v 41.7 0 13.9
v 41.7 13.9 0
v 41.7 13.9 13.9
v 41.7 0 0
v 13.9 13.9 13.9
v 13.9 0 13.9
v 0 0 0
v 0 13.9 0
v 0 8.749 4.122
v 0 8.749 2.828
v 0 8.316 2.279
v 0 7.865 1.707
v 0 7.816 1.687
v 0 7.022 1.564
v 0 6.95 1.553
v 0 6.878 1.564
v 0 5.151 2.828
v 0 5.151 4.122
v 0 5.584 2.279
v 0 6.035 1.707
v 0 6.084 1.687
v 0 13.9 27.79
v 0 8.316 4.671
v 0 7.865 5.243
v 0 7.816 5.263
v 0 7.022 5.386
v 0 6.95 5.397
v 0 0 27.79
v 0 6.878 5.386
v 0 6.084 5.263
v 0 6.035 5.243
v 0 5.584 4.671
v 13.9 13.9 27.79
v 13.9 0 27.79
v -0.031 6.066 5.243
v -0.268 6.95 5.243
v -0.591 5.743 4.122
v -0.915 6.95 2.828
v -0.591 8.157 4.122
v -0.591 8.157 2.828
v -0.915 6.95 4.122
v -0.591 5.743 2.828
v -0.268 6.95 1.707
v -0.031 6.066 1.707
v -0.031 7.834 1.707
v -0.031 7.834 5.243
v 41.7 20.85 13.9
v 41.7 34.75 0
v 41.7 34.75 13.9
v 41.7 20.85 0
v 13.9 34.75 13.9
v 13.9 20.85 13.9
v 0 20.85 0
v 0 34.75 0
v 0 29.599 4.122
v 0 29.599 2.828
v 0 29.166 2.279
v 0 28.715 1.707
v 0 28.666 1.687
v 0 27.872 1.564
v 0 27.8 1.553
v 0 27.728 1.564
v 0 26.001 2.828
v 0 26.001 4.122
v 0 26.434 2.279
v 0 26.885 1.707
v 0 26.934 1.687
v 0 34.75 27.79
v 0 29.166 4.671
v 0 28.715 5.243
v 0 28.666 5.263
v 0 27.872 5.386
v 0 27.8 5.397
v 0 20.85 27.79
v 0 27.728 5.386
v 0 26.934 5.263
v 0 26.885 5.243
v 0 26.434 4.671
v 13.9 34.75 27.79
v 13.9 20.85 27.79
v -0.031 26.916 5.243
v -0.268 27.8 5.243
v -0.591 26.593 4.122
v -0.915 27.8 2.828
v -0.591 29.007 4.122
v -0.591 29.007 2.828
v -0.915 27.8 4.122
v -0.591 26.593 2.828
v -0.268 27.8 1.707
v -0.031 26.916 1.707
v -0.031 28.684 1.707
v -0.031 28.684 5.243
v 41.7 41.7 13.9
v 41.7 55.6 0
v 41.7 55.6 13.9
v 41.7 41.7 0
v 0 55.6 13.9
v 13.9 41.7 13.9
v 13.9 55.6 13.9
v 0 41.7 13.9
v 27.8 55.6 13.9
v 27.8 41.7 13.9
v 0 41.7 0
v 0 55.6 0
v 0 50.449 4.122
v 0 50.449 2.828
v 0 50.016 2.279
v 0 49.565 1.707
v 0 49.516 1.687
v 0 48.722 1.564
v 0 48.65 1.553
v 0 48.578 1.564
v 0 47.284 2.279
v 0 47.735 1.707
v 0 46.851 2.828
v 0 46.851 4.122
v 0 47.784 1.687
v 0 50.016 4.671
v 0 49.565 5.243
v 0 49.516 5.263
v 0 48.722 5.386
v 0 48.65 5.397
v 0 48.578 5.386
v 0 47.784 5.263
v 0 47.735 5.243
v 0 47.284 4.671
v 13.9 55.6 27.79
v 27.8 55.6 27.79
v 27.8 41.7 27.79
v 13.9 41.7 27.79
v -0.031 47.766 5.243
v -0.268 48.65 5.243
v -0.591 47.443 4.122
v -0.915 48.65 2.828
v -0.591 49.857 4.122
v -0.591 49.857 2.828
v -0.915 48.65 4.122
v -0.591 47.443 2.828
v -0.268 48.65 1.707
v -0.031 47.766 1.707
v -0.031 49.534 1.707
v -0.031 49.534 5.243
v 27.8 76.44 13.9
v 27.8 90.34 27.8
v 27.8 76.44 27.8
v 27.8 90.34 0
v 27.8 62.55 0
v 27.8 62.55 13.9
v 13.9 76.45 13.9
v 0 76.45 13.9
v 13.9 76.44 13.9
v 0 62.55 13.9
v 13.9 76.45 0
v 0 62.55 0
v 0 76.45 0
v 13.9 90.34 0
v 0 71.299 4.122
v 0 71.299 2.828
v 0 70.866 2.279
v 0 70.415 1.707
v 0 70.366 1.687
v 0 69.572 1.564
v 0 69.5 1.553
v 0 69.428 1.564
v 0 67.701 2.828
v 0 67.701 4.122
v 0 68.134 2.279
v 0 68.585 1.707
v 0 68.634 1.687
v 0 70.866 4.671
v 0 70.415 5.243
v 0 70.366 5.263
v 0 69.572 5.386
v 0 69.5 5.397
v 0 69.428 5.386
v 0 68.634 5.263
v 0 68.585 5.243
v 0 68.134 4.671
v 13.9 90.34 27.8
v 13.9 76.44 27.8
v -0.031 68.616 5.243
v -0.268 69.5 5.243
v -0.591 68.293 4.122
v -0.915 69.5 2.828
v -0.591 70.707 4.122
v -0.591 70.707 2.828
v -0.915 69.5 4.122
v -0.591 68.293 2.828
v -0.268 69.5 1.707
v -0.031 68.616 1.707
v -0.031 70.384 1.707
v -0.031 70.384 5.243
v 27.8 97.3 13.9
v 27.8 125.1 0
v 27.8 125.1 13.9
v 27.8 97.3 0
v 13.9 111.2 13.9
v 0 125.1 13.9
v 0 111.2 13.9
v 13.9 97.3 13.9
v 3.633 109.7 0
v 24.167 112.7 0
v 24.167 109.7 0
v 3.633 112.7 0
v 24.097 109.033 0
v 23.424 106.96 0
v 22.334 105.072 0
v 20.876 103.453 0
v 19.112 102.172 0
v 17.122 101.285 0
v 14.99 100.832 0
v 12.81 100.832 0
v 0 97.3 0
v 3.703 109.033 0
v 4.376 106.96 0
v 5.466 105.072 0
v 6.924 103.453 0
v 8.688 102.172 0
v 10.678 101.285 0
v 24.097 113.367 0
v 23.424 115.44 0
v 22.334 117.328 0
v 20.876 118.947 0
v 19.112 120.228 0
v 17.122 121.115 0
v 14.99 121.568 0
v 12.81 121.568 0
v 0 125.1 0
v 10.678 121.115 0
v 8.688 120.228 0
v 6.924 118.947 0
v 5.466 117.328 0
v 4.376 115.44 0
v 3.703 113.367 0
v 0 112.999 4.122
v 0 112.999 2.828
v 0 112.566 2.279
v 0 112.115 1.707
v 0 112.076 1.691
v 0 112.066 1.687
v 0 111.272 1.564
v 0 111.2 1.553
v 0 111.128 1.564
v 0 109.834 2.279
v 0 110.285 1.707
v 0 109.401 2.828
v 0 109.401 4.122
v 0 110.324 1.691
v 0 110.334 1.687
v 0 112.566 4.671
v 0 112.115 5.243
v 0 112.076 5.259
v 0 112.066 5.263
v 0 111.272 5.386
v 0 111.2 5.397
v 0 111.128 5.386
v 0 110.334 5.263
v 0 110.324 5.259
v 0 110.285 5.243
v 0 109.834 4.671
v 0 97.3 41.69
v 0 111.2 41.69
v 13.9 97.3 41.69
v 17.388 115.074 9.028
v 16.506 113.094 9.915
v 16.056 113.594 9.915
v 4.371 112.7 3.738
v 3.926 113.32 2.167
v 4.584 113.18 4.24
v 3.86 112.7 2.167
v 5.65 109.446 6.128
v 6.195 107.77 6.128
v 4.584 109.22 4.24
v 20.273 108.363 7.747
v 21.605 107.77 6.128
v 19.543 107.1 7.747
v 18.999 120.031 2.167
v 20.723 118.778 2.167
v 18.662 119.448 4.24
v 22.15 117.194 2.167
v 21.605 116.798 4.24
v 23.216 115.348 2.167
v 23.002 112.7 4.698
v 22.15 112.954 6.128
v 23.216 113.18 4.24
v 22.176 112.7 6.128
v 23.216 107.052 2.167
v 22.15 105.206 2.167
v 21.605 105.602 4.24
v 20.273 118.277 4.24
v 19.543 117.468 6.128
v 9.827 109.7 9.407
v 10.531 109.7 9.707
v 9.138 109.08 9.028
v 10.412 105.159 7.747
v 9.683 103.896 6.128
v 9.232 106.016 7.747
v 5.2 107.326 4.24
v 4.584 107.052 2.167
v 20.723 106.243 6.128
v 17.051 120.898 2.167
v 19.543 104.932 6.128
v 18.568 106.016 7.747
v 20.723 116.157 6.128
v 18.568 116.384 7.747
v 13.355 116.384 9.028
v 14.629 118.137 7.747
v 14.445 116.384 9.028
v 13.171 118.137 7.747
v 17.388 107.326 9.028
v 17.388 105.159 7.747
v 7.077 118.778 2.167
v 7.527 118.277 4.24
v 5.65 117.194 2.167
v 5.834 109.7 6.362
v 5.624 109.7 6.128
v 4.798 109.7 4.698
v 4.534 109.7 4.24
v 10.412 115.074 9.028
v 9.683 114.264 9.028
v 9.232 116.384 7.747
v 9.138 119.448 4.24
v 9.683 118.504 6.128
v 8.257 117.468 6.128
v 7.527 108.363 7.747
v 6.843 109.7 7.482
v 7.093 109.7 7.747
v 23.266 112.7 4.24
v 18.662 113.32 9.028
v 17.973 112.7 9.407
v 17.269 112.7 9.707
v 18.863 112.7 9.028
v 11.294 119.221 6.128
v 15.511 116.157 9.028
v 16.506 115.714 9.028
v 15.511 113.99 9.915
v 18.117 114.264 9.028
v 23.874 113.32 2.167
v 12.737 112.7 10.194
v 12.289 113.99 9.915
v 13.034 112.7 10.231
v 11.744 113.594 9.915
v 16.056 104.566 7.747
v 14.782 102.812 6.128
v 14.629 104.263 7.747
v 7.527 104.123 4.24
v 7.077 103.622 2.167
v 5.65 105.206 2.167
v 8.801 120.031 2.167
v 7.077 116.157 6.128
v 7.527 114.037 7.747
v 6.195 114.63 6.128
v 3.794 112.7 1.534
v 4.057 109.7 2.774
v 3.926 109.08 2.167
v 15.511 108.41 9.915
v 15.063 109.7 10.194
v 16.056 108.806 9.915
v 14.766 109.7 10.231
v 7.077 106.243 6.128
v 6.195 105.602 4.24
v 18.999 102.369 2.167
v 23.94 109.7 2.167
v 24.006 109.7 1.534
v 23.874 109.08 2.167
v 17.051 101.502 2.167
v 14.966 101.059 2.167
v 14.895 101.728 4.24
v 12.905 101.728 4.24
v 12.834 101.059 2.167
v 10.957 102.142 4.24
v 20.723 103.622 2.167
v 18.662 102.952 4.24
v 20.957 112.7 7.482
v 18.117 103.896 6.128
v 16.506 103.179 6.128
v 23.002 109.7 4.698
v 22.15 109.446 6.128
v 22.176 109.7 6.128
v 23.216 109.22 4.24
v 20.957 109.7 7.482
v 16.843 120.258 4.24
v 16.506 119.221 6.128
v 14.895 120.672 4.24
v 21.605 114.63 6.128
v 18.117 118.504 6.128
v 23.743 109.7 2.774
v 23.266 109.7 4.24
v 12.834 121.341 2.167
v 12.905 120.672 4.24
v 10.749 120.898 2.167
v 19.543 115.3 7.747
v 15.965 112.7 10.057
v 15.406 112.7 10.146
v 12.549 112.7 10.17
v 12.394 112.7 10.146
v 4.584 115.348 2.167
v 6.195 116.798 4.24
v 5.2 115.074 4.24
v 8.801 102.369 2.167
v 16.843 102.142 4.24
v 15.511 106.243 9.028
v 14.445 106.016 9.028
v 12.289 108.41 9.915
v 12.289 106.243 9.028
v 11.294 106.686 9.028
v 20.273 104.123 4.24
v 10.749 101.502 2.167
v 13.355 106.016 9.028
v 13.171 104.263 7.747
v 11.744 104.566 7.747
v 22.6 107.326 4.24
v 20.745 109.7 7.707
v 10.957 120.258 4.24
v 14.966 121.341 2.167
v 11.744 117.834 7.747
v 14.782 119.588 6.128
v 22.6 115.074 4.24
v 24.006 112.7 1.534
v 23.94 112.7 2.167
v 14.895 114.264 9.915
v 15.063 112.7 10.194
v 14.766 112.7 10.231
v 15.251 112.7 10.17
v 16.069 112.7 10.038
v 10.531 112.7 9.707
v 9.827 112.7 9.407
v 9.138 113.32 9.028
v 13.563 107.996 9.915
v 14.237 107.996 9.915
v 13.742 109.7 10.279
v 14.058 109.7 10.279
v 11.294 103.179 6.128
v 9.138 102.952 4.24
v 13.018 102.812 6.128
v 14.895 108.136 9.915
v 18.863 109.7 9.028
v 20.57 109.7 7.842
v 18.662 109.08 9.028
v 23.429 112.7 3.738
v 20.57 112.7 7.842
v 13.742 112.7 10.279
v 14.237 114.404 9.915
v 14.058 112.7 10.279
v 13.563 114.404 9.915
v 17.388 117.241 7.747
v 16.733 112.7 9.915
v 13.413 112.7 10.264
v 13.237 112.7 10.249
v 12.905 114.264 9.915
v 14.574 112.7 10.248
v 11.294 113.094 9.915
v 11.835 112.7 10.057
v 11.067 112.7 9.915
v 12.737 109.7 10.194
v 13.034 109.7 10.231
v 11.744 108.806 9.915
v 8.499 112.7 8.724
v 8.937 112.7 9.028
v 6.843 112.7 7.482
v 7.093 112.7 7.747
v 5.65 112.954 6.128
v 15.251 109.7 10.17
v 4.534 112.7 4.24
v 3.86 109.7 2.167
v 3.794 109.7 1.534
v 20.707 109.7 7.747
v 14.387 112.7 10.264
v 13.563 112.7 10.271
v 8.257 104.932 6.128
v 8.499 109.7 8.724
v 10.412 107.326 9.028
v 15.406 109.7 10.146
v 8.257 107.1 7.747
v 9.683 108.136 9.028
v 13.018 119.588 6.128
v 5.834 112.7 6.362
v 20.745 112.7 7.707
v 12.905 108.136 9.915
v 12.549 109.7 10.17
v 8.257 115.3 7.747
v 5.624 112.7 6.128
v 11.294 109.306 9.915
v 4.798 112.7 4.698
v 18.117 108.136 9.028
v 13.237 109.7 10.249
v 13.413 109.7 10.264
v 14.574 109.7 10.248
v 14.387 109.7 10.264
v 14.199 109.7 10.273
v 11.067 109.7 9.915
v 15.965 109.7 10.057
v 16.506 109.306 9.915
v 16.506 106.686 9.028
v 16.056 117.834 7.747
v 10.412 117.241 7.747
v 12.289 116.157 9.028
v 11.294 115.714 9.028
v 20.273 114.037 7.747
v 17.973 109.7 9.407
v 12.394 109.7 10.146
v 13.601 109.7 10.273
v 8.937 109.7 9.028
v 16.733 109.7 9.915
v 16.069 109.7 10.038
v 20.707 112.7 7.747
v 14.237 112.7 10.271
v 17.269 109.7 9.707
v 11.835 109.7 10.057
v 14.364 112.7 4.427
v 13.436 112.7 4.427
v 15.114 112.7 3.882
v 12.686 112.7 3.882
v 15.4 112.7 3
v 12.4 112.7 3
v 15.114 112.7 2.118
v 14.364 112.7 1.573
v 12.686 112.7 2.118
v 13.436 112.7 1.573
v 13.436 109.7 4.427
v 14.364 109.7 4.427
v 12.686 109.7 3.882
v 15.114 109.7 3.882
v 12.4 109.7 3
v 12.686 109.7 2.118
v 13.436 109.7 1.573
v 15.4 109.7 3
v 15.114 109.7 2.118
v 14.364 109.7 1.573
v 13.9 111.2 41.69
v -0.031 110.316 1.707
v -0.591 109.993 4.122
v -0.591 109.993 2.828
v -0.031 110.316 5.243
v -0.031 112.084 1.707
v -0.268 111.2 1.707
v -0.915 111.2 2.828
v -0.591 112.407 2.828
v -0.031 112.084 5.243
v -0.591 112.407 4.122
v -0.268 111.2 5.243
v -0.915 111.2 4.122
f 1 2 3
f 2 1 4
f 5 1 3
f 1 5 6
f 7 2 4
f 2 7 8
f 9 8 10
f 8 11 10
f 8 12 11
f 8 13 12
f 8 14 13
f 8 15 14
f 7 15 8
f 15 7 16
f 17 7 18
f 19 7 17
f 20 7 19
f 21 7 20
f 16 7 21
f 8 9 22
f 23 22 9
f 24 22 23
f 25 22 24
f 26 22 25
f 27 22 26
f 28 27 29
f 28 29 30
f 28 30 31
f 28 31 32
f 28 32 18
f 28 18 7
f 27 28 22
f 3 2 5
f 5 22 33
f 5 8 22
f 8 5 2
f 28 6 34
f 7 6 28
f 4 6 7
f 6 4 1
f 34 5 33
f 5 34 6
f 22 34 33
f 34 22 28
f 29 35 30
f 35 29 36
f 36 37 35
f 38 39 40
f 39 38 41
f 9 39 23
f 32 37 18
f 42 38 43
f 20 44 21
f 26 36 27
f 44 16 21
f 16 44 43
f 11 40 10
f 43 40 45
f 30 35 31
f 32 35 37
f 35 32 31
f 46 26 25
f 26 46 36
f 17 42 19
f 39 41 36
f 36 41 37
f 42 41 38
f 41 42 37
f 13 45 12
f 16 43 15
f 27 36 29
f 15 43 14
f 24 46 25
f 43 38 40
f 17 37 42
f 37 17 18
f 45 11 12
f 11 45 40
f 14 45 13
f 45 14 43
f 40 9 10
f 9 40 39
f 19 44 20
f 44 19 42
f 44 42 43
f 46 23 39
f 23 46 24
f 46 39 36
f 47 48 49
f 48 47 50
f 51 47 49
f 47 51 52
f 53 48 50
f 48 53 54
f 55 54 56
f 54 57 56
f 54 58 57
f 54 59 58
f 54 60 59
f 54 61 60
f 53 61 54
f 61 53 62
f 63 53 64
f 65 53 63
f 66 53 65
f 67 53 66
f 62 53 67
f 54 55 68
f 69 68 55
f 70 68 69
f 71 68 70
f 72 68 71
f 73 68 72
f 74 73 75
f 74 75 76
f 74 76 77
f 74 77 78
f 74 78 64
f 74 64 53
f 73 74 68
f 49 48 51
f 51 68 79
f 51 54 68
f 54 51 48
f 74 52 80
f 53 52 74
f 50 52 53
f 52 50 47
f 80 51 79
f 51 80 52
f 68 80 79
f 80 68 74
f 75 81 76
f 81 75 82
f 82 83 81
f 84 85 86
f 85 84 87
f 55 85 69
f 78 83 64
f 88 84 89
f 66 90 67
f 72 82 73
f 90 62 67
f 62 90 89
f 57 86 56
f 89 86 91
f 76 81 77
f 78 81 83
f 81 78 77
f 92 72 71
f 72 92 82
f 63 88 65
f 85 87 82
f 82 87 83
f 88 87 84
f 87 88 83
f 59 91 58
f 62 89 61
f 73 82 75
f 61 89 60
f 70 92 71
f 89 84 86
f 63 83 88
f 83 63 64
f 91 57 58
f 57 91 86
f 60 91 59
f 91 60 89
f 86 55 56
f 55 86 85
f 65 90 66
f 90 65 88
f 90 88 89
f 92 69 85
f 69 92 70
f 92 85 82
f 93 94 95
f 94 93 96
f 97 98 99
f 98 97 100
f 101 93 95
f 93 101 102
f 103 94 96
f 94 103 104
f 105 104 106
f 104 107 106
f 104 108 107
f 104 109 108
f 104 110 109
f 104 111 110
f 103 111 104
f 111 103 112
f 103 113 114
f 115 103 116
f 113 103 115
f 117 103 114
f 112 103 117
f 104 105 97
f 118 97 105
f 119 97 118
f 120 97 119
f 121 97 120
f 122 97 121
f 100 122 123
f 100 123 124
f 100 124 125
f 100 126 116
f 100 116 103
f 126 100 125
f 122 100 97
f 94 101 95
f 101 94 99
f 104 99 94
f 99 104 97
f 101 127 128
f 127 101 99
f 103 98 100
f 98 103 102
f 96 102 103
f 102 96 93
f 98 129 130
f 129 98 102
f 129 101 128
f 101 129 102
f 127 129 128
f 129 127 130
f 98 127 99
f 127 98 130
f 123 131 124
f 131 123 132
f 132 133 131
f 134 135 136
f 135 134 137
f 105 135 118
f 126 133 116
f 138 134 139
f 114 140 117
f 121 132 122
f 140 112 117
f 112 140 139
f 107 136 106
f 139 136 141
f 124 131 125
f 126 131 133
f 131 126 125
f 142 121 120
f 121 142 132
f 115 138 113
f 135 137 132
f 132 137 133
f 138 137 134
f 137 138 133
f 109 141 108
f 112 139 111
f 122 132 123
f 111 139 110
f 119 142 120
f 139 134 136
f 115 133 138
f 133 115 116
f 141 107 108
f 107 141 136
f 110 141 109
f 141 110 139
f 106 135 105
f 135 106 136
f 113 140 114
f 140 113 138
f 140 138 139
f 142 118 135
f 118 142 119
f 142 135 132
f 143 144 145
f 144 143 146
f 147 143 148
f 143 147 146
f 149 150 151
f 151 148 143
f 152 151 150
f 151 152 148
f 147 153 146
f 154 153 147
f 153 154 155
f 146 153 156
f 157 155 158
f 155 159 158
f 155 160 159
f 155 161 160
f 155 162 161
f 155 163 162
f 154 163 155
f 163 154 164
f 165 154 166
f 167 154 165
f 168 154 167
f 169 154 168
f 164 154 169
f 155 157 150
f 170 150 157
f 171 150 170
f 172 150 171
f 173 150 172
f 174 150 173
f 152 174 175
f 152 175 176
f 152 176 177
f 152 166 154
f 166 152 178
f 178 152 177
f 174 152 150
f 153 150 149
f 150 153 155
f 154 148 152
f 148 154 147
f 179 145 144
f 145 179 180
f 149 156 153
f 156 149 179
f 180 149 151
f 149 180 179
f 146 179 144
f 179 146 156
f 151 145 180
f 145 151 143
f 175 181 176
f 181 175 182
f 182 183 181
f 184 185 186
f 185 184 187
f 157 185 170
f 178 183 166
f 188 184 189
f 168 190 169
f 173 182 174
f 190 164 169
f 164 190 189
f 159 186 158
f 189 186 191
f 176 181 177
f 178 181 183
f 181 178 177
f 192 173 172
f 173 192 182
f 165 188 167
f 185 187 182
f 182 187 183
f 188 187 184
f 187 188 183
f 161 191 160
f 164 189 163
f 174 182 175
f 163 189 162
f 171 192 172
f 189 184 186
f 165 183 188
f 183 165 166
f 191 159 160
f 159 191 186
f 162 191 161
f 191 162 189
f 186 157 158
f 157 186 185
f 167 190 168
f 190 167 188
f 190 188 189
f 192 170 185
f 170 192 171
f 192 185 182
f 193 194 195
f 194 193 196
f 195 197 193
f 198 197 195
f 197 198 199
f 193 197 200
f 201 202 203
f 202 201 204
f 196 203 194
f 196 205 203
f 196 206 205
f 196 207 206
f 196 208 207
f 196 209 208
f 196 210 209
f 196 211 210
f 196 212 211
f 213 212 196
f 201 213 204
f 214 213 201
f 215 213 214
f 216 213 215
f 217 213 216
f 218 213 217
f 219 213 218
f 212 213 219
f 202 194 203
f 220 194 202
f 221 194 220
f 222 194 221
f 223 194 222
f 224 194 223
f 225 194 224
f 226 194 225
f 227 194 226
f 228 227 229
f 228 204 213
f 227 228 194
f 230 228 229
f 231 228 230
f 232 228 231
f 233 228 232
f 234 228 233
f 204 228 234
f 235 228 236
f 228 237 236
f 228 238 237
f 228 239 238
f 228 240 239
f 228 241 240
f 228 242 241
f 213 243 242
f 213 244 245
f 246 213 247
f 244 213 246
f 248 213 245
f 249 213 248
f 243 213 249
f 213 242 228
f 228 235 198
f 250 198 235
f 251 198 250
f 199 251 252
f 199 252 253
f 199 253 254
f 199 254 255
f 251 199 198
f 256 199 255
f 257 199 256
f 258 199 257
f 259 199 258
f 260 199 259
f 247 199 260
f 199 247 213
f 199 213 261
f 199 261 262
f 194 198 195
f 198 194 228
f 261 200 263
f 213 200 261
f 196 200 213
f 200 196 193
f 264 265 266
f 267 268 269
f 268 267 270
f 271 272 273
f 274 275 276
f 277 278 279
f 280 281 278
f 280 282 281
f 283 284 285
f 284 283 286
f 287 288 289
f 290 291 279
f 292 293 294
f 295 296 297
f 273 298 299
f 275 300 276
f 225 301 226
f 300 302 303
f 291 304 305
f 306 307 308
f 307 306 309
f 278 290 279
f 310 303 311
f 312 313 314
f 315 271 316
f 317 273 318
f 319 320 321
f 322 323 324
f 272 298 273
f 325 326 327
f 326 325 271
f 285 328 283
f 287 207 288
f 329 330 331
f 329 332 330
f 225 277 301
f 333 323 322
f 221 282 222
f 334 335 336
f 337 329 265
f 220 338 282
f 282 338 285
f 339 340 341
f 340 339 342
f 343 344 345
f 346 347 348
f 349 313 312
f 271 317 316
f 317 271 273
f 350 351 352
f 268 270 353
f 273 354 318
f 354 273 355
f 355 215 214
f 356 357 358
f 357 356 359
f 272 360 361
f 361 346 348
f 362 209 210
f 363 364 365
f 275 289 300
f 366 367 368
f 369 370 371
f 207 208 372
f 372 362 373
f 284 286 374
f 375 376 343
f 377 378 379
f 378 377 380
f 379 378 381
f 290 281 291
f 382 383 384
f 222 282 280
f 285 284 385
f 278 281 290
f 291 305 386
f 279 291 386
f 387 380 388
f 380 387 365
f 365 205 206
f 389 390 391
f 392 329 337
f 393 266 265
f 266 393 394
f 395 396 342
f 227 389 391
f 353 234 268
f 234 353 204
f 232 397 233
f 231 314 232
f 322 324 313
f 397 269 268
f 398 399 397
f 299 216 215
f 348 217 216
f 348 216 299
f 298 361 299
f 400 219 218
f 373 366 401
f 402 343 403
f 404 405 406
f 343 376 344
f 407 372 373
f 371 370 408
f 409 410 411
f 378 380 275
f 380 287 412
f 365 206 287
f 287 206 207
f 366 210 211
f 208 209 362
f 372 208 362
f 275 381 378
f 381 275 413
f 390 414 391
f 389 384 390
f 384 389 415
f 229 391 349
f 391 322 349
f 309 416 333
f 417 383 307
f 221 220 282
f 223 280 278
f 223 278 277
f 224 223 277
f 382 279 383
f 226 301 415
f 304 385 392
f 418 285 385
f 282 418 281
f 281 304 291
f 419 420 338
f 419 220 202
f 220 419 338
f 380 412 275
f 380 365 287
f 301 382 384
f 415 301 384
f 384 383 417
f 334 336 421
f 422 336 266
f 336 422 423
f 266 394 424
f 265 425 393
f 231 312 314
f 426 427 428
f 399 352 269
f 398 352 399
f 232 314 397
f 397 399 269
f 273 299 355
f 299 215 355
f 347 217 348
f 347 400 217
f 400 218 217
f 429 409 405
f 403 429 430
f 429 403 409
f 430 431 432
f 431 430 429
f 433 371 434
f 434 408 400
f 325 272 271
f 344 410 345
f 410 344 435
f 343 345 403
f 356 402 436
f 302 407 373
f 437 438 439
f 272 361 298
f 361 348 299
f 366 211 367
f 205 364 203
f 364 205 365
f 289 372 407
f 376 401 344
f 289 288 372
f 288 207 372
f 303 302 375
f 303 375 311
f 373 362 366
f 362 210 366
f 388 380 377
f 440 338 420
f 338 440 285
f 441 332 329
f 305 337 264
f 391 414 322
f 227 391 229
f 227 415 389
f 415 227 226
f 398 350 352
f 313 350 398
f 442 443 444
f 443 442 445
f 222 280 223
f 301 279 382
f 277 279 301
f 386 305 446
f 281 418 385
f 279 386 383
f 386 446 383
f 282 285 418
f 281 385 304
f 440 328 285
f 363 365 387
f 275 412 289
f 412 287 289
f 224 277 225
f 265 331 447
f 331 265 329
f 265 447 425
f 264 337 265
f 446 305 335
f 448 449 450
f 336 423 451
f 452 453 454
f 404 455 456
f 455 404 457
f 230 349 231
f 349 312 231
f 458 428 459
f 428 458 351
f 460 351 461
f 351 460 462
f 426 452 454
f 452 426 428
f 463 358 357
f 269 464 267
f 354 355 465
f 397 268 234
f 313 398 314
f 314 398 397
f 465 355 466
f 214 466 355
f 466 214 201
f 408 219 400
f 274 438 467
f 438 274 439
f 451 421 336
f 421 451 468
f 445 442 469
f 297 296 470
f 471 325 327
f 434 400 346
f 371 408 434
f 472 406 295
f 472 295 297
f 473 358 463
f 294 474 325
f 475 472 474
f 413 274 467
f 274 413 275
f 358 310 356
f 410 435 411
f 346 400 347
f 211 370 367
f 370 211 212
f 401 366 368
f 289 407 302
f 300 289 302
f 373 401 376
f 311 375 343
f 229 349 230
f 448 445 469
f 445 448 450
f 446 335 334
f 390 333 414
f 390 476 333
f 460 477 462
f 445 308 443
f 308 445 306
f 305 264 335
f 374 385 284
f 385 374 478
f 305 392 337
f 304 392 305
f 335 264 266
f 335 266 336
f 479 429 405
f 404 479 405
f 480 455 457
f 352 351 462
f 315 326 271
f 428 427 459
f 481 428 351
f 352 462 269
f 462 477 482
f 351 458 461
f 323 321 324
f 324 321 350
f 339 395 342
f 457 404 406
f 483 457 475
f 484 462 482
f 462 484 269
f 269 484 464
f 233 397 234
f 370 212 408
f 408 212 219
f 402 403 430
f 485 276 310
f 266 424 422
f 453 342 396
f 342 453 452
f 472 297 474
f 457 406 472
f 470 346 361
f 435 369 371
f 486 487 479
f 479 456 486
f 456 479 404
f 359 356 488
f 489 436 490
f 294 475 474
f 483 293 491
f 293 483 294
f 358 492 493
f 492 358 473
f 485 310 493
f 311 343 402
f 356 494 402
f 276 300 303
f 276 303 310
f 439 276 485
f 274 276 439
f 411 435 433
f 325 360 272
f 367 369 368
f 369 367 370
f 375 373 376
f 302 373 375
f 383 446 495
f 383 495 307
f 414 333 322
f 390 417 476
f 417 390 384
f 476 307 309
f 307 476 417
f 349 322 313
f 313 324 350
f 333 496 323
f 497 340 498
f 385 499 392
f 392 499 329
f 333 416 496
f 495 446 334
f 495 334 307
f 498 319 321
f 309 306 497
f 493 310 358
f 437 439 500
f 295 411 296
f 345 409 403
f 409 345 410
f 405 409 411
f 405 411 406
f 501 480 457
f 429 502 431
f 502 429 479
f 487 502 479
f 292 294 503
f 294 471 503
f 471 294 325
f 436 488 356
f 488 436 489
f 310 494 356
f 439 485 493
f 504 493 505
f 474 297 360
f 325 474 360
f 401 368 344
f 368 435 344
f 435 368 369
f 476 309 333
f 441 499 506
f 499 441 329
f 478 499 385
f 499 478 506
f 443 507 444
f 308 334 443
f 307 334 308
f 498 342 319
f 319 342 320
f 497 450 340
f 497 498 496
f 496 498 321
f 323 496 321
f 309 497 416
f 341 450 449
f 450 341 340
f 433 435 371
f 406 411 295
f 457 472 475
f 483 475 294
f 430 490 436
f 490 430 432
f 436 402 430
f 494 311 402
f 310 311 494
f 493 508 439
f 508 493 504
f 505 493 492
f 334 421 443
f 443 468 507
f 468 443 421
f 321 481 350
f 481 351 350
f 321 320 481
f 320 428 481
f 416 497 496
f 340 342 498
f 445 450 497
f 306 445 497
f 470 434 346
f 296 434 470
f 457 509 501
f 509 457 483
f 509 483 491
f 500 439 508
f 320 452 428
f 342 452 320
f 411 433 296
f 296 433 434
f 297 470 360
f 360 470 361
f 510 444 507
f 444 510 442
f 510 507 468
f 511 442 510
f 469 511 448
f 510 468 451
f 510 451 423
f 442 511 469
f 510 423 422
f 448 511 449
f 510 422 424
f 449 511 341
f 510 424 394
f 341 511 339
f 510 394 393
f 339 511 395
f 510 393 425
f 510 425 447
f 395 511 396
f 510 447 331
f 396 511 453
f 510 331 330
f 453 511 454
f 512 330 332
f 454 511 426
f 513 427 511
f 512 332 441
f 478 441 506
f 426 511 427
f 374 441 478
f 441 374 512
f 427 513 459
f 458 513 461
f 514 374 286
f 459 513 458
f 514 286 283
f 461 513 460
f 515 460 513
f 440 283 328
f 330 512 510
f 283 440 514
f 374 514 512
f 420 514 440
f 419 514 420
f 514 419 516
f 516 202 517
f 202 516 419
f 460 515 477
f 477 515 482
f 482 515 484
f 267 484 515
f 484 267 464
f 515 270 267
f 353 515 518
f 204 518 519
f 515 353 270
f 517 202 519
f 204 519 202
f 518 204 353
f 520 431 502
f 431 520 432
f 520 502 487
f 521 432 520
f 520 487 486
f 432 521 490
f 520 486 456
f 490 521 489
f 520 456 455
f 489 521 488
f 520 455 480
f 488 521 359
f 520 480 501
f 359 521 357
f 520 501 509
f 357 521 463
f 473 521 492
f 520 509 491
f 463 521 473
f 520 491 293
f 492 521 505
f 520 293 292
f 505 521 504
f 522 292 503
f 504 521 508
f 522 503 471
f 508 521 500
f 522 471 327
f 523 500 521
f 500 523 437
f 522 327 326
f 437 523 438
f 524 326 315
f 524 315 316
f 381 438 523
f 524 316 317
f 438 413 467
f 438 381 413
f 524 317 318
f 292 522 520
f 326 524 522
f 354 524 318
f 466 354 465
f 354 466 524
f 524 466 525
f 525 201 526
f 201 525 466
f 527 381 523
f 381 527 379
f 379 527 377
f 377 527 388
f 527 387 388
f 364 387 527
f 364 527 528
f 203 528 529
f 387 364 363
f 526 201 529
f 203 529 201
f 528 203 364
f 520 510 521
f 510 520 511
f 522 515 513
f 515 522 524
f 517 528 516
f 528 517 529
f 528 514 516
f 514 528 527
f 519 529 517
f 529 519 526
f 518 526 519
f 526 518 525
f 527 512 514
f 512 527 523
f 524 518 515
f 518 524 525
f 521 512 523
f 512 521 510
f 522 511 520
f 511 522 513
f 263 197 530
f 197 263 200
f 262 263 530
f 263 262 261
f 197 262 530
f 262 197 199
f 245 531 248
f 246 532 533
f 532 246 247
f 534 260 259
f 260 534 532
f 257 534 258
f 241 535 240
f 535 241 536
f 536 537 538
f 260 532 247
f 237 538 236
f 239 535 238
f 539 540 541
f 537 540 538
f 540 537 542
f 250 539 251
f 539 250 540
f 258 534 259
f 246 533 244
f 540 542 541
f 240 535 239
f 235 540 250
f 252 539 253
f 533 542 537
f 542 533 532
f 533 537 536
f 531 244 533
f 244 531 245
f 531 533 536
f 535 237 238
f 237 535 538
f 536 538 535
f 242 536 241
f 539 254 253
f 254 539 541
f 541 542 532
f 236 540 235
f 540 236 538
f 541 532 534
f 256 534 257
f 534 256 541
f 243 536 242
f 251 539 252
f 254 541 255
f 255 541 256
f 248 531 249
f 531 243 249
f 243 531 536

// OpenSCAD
X=14-.1;
fingerWidth=3;
small=0.01;

module Lshape()
{
    cube([3*X,X,X]);
    translate([0,0,X-small]) 
    cube([X,X,X]);
    
    translate([1.5,X/2,X/4])
    sphere(r=2.5,$fn=12);
}

module Tshape()
{
    cube([3*X,X,X]);
    translate([X,0,X-small]) 
    cube([X,X,X]);    
    
    translate([1.5,X/2,X/4])
    sphere(r=2.5,$fn=12);
}

module Zshape()
{
    cube([2*X,X,X]);
    translate([X,X-small,0]) 
    cube([X,X,2*X]);
    
    translate([1.5,X/2,X/4])
    sphere(r=2.5,$fn=12);
}

module Qshape()
{
    union()
    {
        difference()
        {
            cube([2*X,2*X,X]);
            translate([X,X,0])
            sphere(d=1.5*X);
        }
        translate([0,0,X-small]) 
        cube([X,X,2*X]);
        difference()
        {
            translate([0,X-fingerWidth/2,0]) 
            cube([2*X-small,fingerWidth,1*X]);
            translate([X, X-fingerWidth, fingerWidth])
            rotate([-90,0,0])
            cylinder(d=fingerWidth, h=2*fingerWidth,$fn=10);
        }
        translate([1.5,X,X/4])
        sphere(r=2.5,$fn=12);
        /*
        translate([X, 1.5,X/4])
        sphere(r=2.5,$fn=12);
        
        translate([2*X-1.5,X,X/4])
        sphere(r=2.5,$fn=12);
        
        translate([X,2*X-1.5,X/4])
        sphere(r=2.5,$fn=12);
        */
    }
}
//!Qshape();

Lshape();
translate([0,1.5*X,0]) Lshape();
translate([0,3.0*X,0]) Tshape();
translate([0,4.5*X,0]) Zshape();
translate([0,7.0*X,0]) Qshape();
